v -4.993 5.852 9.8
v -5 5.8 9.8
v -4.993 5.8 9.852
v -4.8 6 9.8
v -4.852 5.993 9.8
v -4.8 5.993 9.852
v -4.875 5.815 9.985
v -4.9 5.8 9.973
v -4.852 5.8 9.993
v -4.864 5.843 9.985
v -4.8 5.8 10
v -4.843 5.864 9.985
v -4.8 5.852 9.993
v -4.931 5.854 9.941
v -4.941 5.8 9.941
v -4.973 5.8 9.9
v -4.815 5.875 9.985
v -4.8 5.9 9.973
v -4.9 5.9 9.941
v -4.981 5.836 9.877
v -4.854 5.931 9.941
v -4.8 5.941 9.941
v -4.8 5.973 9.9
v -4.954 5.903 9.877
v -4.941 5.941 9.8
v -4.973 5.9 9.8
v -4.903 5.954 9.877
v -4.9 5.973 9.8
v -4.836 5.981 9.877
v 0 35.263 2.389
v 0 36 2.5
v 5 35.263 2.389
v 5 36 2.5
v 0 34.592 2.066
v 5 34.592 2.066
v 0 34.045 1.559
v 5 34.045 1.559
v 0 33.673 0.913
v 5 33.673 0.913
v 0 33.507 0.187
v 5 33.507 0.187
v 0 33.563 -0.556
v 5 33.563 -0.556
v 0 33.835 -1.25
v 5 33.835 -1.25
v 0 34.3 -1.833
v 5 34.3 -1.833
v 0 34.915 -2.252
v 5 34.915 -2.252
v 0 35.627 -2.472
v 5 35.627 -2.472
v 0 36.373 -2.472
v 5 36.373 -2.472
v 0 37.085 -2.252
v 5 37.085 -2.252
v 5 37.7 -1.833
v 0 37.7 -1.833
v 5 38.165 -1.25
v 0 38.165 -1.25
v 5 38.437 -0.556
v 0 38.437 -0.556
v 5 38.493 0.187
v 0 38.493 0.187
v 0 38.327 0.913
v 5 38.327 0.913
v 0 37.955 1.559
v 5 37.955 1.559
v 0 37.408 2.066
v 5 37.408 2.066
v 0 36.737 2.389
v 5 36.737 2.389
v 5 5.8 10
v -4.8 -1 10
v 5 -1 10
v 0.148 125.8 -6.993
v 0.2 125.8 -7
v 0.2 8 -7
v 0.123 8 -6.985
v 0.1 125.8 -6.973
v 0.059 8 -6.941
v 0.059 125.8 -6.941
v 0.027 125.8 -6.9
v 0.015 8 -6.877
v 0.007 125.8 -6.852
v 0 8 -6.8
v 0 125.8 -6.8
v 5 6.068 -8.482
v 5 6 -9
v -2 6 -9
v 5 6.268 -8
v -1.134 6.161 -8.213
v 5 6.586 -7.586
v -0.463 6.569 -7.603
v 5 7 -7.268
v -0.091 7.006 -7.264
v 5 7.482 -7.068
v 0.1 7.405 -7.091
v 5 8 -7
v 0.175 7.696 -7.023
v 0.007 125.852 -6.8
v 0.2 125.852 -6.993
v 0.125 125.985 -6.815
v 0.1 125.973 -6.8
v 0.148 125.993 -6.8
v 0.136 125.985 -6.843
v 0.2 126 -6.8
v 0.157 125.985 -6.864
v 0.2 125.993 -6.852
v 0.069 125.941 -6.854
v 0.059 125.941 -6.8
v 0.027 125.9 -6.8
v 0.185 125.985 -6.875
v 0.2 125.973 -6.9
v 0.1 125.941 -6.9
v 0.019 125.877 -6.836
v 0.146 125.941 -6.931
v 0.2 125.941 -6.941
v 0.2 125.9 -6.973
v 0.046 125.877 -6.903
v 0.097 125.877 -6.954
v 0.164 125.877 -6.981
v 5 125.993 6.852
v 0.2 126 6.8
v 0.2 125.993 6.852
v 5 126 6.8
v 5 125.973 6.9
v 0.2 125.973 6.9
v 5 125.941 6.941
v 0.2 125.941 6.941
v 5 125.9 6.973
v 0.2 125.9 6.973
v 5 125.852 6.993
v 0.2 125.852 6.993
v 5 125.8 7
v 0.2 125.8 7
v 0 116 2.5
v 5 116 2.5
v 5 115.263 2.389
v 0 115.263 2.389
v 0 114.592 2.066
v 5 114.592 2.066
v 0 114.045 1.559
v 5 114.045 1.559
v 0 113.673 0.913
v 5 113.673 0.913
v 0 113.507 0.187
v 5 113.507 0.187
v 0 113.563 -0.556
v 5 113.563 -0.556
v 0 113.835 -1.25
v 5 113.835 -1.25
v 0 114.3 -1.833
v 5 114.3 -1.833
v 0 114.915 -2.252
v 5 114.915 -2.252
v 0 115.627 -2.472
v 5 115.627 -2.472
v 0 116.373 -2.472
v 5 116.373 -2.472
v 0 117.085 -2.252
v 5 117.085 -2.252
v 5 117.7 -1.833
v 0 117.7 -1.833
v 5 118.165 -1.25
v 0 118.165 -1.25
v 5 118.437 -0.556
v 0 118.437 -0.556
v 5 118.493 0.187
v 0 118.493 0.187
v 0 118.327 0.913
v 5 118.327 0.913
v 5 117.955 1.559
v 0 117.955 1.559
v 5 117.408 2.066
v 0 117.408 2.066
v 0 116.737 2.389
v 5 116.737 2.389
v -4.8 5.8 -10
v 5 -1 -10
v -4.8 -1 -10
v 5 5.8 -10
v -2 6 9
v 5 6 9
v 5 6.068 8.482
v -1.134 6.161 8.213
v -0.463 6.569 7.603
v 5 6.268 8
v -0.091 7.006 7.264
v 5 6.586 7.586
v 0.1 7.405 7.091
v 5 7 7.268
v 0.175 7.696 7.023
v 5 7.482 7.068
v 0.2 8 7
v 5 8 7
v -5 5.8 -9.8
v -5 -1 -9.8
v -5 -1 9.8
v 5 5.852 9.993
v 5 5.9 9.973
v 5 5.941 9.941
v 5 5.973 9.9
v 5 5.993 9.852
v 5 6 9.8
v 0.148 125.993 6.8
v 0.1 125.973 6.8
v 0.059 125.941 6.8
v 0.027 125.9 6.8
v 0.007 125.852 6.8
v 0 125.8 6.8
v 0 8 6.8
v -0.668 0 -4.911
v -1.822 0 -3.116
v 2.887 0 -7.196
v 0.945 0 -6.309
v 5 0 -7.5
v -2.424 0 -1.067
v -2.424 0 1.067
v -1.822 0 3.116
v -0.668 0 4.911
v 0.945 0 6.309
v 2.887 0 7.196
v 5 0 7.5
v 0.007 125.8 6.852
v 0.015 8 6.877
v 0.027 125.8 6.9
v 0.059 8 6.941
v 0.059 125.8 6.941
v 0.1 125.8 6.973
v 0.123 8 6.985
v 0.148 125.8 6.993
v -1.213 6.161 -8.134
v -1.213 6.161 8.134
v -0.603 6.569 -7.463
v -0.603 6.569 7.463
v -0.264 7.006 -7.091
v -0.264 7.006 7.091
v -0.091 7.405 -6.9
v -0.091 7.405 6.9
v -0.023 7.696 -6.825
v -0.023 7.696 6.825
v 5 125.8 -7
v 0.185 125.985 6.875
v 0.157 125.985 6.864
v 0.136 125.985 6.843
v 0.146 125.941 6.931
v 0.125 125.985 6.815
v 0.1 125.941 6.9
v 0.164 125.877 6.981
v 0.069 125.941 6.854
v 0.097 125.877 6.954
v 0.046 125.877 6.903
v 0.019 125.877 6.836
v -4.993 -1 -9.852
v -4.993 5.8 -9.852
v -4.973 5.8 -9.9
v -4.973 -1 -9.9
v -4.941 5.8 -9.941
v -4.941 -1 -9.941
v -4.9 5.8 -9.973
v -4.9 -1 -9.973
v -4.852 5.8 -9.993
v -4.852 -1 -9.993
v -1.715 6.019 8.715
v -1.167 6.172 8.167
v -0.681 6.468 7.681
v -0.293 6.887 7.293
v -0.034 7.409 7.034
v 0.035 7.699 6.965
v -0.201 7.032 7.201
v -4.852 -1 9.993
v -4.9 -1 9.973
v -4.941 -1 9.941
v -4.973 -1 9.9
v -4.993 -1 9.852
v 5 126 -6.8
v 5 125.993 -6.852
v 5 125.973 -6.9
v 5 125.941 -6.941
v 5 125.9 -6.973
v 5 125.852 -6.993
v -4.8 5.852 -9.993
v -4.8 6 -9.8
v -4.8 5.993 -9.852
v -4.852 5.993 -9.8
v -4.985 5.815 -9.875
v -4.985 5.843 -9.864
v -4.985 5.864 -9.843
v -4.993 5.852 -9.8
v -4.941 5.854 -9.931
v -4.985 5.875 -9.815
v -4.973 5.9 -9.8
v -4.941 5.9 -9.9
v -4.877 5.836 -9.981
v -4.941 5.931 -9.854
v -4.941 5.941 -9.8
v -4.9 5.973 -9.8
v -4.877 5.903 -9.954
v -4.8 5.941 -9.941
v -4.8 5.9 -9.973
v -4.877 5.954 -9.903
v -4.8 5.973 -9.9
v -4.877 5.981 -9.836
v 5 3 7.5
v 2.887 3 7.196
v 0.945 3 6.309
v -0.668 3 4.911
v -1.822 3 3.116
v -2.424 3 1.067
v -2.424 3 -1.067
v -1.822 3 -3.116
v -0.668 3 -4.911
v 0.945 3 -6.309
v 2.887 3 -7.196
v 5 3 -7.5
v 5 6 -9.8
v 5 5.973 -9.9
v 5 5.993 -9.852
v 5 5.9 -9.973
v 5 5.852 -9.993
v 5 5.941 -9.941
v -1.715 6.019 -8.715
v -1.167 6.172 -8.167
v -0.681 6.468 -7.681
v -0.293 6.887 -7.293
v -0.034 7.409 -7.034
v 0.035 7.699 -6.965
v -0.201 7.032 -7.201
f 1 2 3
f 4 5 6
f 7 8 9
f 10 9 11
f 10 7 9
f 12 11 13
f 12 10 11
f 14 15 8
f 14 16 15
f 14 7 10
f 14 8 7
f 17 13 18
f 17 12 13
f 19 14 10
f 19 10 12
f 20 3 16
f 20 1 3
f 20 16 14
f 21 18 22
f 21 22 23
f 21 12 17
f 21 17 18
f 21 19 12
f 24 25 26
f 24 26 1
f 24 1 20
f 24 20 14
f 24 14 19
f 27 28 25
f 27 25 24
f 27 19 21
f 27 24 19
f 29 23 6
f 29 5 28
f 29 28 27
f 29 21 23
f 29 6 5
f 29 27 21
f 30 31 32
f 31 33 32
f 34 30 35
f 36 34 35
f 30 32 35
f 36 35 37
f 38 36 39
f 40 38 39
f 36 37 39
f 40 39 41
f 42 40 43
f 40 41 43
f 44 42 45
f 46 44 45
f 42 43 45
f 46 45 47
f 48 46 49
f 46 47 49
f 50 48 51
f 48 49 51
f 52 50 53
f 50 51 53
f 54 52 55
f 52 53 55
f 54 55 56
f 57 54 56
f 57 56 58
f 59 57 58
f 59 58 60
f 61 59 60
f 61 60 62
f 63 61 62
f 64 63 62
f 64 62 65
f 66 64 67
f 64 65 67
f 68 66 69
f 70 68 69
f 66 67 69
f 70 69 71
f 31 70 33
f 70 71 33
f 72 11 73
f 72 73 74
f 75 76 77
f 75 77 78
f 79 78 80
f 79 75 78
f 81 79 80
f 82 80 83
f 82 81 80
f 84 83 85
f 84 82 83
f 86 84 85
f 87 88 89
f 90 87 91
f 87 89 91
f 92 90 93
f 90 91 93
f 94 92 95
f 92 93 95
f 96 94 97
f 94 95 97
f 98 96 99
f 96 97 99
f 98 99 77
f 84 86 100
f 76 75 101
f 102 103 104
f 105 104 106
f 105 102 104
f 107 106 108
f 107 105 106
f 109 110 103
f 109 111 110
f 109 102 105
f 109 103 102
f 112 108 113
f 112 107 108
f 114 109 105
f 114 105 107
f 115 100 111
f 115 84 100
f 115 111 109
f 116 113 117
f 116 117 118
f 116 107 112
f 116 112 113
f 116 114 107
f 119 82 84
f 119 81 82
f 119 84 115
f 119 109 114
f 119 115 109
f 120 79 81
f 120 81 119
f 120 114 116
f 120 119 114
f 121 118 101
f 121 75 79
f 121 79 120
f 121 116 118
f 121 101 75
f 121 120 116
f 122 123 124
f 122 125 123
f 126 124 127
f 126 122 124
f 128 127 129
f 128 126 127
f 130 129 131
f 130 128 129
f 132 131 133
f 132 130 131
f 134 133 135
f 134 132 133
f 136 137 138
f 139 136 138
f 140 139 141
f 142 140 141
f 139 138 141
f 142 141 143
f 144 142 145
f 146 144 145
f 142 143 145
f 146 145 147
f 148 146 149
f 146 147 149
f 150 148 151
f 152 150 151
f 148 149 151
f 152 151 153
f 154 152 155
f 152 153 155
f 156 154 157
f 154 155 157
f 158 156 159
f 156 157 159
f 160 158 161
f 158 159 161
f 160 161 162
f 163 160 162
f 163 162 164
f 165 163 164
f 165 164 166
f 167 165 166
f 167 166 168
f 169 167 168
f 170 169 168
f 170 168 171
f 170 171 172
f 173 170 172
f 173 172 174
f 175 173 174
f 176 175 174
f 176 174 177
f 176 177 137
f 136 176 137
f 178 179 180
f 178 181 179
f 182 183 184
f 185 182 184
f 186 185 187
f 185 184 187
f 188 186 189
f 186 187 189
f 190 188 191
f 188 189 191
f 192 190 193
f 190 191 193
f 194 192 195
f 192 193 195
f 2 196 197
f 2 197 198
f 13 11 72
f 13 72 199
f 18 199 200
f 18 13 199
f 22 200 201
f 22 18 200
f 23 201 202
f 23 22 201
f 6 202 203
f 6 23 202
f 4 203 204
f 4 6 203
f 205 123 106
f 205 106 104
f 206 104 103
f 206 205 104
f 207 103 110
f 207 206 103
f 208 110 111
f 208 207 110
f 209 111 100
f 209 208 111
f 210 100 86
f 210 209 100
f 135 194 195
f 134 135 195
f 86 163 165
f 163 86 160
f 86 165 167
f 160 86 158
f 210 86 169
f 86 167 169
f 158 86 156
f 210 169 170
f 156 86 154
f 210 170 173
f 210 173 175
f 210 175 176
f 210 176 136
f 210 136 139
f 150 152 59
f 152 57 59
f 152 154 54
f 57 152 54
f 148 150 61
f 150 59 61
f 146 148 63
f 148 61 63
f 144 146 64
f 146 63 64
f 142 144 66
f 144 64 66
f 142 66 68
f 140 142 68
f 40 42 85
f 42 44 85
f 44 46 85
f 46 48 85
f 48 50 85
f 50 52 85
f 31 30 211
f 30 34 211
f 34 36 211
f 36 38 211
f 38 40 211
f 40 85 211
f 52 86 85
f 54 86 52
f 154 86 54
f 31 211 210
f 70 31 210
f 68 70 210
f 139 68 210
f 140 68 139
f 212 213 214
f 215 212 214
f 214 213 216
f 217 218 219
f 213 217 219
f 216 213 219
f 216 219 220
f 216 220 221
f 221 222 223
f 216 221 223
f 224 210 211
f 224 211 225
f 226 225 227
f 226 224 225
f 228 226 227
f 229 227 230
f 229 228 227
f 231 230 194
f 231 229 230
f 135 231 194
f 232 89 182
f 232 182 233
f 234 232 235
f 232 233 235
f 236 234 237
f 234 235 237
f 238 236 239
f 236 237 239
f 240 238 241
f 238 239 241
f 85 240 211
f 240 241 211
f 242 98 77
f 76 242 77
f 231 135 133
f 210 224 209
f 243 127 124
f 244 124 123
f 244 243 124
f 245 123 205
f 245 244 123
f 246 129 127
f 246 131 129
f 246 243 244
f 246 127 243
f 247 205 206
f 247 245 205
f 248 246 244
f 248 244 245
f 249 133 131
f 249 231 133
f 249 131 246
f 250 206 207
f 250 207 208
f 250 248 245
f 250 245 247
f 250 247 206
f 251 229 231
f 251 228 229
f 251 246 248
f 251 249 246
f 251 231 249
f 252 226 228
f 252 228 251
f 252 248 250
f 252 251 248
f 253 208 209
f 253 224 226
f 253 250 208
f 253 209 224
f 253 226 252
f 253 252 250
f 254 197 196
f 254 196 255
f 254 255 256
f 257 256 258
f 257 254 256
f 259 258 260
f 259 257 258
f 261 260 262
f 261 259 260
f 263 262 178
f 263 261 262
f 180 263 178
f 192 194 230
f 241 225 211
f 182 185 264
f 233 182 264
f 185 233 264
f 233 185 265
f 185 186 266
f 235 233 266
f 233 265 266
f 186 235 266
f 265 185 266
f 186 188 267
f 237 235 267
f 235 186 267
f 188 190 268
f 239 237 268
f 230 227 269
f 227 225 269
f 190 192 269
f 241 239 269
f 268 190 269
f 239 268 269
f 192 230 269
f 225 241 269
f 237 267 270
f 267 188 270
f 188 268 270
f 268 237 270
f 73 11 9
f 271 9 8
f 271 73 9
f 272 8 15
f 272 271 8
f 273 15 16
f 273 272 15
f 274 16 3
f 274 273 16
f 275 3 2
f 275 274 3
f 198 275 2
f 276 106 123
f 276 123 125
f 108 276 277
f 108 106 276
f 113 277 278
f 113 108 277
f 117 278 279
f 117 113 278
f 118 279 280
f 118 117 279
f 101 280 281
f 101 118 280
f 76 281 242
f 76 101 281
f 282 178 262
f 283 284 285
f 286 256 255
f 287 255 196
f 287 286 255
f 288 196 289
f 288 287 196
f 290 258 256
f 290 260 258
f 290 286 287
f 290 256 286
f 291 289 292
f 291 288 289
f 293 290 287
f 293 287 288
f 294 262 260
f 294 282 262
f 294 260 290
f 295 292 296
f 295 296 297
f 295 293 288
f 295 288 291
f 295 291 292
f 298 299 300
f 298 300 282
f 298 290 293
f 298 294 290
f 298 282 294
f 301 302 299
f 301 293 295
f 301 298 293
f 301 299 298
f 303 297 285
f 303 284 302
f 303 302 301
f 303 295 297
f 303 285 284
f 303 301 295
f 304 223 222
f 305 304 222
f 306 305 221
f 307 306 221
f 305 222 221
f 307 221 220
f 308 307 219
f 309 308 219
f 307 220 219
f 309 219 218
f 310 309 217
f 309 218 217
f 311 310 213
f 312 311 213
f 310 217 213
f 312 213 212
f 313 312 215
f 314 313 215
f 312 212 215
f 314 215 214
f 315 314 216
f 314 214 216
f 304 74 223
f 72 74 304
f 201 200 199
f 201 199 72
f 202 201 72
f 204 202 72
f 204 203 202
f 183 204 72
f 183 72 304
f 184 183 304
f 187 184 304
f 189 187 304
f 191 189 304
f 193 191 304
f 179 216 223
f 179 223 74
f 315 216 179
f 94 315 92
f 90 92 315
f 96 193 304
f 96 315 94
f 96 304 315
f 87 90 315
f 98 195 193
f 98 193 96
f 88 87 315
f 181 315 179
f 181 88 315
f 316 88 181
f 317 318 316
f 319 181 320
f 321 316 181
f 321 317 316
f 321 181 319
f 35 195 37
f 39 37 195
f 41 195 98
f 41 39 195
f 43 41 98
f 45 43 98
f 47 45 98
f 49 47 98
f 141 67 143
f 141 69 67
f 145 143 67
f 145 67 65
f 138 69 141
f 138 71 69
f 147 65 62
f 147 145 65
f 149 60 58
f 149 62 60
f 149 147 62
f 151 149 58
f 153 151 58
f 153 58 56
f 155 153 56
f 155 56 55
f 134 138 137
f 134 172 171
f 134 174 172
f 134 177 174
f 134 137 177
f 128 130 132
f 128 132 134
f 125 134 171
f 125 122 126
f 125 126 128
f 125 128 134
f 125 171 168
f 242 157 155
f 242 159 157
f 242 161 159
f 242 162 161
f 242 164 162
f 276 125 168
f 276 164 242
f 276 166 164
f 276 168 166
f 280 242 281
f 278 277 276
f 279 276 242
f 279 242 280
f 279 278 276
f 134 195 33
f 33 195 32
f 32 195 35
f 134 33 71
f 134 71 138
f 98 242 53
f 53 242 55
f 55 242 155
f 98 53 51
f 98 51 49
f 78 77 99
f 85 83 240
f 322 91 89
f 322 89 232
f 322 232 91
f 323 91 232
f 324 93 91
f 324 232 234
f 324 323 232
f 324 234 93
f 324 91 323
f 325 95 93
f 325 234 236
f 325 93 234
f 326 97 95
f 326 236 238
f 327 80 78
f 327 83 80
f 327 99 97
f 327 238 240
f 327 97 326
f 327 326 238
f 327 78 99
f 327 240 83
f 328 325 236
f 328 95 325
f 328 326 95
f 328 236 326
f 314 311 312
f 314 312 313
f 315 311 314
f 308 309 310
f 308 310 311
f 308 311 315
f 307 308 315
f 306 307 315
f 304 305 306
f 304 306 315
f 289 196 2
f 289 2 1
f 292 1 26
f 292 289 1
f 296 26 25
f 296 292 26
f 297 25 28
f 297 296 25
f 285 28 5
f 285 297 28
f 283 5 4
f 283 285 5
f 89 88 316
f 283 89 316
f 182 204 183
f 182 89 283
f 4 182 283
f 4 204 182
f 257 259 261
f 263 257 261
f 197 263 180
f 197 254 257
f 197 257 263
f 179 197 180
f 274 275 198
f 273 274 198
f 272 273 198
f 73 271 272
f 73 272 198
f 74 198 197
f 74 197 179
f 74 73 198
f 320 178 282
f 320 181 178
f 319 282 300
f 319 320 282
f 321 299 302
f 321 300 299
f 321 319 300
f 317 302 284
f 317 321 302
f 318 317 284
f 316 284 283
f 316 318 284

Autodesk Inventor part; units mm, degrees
ref_plane "YZ Plane" through (0, 0, 0) normal (1, 0, 0) x (0, 1, 0)
ref_plane "XZ Plane" through (0, 0, 0) normal (0, 1, 0) x (-1, 0, 0)
ref_plane "XY Plane" through (0, 0, 0) normal (0, 0, 1) x (1, 0, 0)
sketch "スケッチ1" plane through (0, 0, 0) normal (0, 1, 0) x (-1, 0, 0)
  line L0 (5, -10) -> (-5, -10)
  line L1 (-5, -10) -> (-5, 10)
  line L2 (-5, 10) -> (5, 10)
  line L3 (5, 10) -> (5, -10)
  line L4 (5, -10) -> (-5, 10) construction
  line L5 (-5, -10) -> (5, 10) construction
  point P0 (0, 0)
  dimension "d0" = 10
  dimension "d1" = 20
extrude "押し出し1" add sketch "スケッチ1" along normal blind 6
sketch "スケッチ2" plane through (0, 0, 0) normal (0, -1, 0) x (1, 0, 0)
  line L0 (5, 10) -> (5, -10) projected
  circle A0 centre (5, 0) radius 7.5
  point P0 (0, 0)
  point P1 (5, -7.5)
  point P2 (5, 7.5)
  dimension "d4" = 15
extrude "押し出し2" cut sketch "スケッチ2" against normal blind 3 contours L0 A0 picked at (1.9199, 0.374)
sketch "スケッチ3" plane through (0, 0, 0) normal (0, -1, 0) x (1, 0, 0)
  line L0 (-5, 10) -> (5, 10)
  line L1 (5, 10) -> (5, -10)
  line L2 (5, -10) -> (-5, -10)
  line L3 (-5, -10) -> (-5, 10)
  line L4 (-5, 10) -> (5, -10) construction
  line L5 (5, 10) -> (-5, -10) construction
  point P0 (0, 0)
  dimension "d7" = 10
  dimension "d8" = 20
extrude "押し出し3" add sketch "スケッチ3" along normal blind 1
sketch "スケッチ4" plane through (0, 6, 0) normal (0, 1, 0) x (1, 0, 0)
  line L0 (5, 7) -> (0, 7)
  line L1 (0, 7) -> (0, -7)
  line L2 (0, -7) -> (5, -7)
  line L3 (5, -7) -> (5, 7)
  line L4 (5, -10) -> (5, 10) projected
  point P0 (0, 0)
  dimension "d11" = 5
  dimension "d12" = 14
  dimension "d13" = 5
  dimension "d14" = 7
extrude "押し出し4" add sketch "スケッチ4" along normal blind 120
fillet "フィレット1" radius 2 3 edges at (2.5, 6, 7) (2.5, 6, -7) (0, 6, 0)
fillet "フィレット2" radius 0.2 12 edges at (-0.5858, 6.5858, -7.5858) (0, 67, -7) (-0.5858, 6.5858, 7.5858) (0, 67, 7) (2.5, 126, 7) (0, 126, 0) (2.5, 126, -7) (0, 6, -10) (-5, 6, 0) (0, 6, 10) (-5, 2.5, 10) (-5, 2.5, -10)
sketch "スケッチ5" plane through (0, 8, 6.8) normal (-1, 0, 0) x (0, 0, 1)
  line L0 (3, -2) -> (-16.6, -2) projected
  line L1 (-13.8, 117.8) -> (-13.8, 0) projected
  point P0 (-6.8, -8)
  point P1 (-6.8, 28)
  point P2 (-6.8, 108)
  dimension "d19" = 30
  dimension "d20" = 80
  dimension "d21" = 7
  dimension "d22" = 7
hole "穴1" at (0, 36, 0) at (0, 116, 0) direction (1, 0, 0) diameter 5 end through all
properties part number "baseB"
